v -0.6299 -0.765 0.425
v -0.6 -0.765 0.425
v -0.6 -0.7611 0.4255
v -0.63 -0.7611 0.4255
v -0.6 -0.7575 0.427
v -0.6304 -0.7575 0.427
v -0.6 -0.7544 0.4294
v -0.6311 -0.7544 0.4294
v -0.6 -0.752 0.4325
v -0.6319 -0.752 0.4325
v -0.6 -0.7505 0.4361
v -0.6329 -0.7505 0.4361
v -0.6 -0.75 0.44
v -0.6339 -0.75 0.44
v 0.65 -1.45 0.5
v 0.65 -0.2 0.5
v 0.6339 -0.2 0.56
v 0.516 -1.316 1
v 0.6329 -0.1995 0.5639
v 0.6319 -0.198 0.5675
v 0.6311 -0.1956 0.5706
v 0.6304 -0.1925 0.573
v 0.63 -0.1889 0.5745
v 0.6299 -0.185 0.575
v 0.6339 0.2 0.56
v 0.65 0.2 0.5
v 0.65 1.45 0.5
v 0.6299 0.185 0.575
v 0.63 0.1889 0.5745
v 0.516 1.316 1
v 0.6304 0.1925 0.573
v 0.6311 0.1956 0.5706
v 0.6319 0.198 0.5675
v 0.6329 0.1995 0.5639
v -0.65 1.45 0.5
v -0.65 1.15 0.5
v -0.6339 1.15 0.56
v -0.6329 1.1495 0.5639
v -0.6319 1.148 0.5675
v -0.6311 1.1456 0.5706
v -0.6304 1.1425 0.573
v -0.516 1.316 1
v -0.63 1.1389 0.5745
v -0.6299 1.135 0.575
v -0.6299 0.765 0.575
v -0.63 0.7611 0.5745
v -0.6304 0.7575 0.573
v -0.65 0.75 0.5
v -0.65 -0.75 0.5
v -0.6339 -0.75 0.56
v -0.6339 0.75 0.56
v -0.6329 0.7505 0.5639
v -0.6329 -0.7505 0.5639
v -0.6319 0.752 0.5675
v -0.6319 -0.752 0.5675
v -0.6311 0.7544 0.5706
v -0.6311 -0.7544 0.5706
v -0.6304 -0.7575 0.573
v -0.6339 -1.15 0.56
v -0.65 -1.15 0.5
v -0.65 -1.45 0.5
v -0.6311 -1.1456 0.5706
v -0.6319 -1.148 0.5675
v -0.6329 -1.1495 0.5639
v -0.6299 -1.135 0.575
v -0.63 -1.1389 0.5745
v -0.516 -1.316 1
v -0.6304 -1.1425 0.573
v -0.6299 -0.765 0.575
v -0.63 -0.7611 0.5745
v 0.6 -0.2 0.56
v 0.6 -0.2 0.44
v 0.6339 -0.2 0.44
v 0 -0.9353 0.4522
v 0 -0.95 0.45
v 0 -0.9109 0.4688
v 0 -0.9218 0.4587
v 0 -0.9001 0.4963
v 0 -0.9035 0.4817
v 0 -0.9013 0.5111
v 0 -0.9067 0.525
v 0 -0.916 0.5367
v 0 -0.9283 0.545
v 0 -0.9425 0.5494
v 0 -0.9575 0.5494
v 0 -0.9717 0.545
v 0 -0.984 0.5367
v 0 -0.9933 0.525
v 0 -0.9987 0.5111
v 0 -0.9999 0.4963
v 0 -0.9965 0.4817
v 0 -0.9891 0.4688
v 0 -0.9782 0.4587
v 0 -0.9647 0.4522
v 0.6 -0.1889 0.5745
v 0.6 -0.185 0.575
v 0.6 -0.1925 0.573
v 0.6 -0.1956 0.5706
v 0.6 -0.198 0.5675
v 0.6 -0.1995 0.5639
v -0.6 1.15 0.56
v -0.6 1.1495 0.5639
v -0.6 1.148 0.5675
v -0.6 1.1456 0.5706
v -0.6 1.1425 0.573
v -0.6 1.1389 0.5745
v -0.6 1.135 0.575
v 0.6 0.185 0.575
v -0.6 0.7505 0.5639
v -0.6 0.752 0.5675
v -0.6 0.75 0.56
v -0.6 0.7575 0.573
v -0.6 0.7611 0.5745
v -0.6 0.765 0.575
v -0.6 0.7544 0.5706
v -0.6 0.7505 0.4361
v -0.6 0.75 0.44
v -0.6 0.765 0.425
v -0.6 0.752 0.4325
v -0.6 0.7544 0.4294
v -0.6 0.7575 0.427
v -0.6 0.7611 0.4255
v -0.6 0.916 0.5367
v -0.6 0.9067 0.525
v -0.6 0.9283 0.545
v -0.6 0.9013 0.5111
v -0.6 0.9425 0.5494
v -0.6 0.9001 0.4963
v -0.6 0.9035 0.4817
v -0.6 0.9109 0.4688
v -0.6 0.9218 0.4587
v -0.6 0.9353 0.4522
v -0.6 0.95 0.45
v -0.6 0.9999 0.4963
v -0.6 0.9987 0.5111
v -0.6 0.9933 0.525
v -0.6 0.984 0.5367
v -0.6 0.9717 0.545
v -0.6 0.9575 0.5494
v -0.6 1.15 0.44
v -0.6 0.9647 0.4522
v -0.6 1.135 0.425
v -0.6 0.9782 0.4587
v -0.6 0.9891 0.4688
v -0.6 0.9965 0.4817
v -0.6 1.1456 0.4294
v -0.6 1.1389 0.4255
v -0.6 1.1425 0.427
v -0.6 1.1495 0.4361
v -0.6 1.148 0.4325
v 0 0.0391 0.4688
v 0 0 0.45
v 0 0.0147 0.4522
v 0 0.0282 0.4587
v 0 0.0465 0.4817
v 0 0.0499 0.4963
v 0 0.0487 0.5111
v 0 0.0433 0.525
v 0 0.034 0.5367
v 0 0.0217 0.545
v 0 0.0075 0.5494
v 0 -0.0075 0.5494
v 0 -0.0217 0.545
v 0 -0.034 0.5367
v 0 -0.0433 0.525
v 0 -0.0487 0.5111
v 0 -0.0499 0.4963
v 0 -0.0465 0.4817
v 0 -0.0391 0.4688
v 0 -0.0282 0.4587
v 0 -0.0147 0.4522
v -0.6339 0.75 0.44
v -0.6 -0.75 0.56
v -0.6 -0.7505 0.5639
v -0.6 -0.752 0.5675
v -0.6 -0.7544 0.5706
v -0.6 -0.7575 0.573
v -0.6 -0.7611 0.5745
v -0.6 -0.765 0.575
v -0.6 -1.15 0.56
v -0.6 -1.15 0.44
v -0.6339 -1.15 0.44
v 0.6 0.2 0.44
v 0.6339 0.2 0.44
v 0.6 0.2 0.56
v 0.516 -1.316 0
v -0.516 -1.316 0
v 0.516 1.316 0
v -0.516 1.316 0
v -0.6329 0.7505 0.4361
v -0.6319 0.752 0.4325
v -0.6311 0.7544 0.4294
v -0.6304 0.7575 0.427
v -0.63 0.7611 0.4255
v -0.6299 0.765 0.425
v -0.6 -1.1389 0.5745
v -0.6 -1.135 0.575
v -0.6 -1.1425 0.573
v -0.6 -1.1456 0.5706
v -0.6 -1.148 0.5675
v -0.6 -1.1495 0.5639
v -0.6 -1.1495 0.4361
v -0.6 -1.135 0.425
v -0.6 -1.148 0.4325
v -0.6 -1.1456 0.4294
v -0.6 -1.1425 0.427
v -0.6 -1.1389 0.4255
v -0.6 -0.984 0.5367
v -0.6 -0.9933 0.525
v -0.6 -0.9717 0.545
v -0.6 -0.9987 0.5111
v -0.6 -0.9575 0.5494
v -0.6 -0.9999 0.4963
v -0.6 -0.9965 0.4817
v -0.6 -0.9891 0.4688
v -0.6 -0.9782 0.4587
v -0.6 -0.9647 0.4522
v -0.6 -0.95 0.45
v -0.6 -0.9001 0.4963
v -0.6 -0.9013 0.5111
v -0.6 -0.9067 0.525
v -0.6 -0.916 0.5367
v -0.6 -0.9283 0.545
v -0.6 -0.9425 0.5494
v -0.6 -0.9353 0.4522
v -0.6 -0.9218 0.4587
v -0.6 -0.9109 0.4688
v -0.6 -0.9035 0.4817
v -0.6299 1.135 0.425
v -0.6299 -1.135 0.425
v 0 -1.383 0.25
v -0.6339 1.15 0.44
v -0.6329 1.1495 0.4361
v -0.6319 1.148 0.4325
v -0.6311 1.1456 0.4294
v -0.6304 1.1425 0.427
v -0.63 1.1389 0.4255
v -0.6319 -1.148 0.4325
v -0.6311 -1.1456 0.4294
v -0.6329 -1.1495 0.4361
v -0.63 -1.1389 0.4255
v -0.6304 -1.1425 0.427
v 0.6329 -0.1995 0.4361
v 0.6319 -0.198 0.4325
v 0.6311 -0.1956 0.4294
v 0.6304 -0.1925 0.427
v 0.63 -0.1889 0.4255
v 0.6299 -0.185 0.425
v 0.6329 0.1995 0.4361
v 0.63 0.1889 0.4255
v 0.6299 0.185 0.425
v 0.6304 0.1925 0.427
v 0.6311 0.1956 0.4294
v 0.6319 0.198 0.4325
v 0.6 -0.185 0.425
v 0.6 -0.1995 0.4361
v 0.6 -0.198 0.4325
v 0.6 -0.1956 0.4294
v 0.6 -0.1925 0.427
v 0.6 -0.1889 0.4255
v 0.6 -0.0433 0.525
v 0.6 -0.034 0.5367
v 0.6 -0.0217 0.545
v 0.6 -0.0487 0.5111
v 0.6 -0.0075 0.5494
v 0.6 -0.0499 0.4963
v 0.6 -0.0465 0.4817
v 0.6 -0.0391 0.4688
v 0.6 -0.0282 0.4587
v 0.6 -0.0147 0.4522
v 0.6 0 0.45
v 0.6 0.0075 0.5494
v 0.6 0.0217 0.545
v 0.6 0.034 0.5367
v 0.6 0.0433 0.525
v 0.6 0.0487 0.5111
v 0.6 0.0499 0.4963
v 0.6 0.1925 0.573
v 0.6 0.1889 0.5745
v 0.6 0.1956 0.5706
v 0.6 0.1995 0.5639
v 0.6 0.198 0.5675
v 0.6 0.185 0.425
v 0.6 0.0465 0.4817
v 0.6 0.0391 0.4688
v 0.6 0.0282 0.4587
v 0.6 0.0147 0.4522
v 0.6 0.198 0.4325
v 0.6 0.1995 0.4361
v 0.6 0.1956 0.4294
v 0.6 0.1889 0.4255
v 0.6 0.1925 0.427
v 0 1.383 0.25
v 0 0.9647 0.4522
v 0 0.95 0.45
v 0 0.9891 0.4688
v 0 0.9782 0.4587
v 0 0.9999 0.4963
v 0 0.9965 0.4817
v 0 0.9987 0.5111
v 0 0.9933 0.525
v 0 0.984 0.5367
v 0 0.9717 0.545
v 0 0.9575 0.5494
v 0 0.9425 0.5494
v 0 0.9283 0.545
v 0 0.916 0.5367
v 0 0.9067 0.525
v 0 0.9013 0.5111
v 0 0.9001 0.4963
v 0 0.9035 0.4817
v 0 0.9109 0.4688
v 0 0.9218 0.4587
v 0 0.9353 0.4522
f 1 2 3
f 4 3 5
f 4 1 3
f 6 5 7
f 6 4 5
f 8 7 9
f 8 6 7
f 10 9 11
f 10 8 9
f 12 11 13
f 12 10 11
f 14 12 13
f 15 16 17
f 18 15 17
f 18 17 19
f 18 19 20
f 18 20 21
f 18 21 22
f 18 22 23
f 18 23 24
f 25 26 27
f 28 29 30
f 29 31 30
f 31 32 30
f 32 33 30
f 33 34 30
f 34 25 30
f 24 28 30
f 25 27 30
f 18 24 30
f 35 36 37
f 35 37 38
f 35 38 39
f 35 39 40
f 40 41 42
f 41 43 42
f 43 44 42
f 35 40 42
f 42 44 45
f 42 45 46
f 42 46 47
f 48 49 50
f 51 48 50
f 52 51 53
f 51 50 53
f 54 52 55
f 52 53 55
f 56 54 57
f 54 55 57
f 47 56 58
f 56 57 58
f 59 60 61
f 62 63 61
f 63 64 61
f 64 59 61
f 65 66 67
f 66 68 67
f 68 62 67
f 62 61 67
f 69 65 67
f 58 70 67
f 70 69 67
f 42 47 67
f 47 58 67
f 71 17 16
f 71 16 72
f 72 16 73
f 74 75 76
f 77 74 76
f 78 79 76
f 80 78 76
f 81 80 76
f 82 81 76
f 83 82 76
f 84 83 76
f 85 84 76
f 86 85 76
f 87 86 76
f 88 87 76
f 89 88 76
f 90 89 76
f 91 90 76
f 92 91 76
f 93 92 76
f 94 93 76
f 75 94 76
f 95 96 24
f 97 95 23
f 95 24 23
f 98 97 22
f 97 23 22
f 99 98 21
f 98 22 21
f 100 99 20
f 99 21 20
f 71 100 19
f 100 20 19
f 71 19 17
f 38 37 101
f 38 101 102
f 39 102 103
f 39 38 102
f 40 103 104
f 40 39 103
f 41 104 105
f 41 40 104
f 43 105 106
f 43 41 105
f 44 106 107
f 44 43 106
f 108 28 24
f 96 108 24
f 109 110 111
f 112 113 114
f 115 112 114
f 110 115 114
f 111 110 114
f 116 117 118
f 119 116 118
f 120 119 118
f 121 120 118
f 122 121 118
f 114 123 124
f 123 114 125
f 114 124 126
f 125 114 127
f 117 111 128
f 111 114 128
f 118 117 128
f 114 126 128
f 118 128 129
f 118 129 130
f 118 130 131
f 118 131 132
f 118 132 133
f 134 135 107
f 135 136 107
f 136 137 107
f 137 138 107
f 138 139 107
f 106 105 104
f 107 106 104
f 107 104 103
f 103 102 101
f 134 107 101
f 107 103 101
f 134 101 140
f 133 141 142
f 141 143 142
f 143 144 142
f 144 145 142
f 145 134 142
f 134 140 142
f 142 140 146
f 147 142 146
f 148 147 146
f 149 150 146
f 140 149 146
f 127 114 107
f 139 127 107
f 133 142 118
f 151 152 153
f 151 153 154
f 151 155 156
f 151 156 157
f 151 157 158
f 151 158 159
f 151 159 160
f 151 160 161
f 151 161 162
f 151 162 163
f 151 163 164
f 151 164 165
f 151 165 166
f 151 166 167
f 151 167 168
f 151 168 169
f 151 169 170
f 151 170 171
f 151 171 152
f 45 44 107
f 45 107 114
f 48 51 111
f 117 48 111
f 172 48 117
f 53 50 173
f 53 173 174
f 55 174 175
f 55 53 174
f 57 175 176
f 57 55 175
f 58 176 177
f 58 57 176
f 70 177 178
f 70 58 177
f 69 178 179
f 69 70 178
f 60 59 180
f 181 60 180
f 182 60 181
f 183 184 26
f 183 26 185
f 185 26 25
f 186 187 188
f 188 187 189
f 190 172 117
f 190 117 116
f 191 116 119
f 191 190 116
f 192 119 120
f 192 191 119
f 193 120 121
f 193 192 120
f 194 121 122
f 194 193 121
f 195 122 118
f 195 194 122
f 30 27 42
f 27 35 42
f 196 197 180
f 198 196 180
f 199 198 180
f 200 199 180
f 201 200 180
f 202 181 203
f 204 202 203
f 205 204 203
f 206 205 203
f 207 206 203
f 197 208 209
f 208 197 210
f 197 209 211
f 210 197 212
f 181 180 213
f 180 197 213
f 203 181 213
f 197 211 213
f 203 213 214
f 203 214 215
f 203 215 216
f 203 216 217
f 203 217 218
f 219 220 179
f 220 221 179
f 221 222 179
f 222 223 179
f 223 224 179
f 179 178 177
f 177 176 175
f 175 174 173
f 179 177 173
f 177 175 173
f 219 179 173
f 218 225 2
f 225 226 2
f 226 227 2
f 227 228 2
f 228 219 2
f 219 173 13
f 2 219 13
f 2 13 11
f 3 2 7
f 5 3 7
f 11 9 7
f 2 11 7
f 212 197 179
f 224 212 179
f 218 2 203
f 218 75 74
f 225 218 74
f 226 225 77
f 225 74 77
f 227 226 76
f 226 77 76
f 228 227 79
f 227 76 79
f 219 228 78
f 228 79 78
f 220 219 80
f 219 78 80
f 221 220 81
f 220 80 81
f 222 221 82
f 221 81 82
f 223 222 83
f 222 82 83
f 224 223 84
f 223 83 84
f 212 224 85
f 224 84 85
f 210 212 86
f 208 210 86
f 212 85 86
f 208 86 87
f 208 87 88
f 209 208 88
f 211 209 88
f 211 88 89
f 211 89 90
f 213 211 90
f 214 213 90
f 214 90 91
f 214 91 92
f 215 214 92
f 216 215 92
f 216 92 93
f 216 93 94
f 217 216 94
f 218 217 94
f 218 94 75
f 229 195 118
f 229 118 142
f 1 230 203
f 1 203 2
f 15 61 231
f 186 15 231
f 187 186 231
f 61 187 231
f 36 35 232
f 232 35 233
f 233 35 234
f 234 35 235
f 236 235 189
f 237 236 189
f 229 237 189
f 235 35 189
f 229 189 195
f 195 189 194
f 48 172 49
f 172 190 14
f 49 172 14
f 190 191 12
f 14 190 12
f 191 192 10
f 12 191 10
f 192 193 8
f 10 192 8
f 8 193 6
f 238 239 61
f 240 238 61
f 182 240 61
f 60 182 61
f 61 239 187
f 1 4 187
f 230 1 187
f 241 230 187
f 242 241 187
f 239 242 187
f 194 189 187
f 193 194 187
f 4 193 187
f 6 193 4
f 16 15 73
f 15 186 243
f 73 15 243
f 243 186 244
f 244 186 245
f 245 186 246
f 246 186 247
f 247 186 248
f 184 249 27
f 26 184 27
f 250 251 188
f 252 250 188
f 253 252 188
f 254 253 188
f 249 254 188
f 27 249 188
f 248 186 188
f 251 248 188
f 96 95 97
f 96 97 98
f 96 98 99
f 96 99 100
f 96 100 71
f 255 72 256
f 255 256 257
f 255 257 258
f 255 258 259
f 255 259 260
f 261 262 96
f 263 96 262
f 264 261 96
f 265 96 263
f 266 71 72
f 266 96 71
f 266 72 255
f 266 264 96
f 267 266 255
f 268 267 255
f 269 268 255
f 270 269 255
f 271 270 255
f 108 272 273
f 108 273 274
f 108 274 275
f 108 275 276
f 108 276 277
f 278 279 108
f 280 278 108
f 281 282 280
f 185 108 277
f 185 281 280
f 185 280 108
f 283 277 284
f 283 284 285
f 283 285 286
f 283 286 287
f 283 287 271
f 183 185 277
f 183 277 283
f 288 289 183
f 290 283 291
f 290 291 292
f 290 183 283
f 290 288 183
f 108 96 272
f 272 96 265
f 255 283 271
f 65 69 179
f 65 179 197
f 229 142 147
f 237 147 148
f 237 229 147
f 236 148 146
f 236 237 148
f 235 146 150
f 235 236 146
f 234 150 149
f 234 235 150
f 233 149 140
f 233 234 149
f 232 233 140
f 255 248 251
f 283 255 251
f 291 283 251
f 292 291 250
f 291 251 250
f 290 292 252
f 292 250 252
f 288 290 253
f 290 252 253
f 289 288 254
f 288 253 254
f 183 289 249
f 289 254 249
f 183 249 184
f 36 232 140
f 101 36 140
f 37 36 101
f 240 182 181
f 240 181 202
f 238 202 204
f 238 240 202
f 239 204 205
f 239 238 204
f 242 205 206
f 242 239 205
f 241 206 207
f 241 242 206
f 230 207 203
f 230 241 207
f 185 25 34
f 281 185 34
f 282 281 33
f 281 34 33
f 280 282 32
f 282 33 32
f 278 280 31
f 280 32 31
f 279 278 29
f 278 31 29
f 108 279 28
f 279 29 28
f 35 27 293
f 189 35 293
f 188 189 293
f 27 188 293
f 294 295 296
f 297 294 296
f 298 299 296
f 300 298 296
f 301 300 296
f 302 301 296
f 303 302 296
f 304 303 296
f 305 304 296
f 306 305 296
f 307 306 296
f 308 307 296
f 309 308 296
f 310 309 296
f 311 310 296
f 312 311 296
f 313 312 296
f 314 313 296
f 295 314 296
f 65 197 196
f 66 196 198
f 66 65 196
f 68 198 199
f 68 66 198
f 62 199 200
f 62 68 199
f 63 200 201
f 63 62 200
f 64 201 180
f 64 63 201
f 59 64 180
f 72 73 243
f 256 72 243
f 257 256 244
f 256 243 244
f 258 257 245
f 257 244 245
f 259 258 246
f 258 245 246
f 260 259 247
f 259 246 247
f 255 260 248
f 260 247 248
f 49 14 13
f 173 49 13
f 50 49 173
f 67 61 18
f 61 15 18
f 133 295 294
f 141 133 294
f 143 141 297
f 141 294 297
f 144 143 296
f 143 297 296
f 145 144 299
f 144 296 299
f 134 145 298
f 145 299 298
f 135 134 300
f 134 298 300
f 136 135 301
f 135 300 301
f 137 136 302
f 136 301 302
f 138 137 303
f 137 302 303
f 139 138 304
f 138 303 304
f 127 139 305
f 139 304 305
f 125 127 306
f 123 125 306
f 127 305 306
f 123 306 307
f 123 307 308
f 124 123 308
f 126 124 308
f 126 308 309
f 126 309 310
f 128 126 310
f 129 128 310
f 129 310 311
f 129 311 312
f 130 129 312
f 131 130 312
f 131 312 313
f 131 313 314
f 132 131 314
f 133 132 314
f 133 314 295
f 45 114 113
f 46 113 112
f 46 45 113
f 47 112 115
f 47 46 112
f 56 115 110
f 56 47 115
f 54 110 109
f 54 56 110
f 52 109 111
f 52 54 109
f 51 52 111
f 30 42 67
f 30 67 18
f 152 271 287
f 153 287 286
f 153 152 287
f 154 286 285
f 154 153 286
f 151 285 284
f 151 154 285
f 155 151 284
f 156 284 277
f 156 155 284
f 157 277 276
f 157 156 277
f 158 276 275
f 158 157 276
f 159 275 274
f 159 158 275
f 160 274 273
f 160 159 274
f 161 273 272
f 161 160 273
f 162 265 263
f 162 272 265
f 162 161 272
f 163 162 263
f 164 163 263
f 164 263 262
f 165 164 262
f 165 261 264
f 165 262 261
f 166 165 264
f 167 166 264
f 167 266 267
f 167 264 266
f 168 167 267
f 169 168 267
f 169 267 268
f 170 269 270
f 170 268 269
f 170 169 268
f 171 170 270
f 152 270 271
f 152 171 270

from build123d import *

# Parameters (mm, degrees)
ESBO_O15_W                         = 1.3
ESBO_O15_H                         = 2.9
RESSALTO_EXTRUS_O1_DEPTH           = 0.5
RESSALTO_EXTRUS_O1_TAPER           = 15
RESSALTO_EXTRUS_O1_OTHER_WAY_DEPTH = 0.5
RESSALTO_EXTRUS_O1_OTHER_WAY_TAPER = 15
ESBO_O18_R                         = 0.05
CORTE_EXTRUS_O1_DEPTH              = 1
ESBO_O18_3_R                       = 0.05
CORTE_EXTRUS_O2_DEPTH              = 1
CORTE_EXTRUS_O3_DEPTH              = 0.05
CORTE_EXTRUS_O4_START              = 1.3
CORTE_EXTRUS_O4_DEPTH              = 0.05


with BuildPart() as part:
    # Esbo_o15 → Ressalto-extrus_o1 (new body)
    with BuildSketch(Plane.XY.offset(0.5)):
        Rectangle(ESBO_O15_W, ESBO_O15_H)
    extrude(amount=-RESSALTO_EXTRUS_O1_DEPTH, taper=RESSALTO_EXTRUS_O1_TAPER)

    # Esbo_o15 → Ressalto-extrus_o1 other way (add)
    with BuildSketch(Plane.XY.offset(0.5)):
        Rectangle(ESBO_O15_W, ESBO_O15_H)
    extrude(amount=RESSALTO_EXTRUS_O1_OTHER_WAY_DEPTH, taper=RESSALTO_EXTRUS_O1_OTHER_WAY_TAPER)

    # Esbo_o18 → Corte-extrus_o1 (cut)
    with BuildSketch(Plane(origin=(0, 0, 0), x_dir=(0, 0, -1), z_dir=(1, 0, 0))):
        with Locations((-0.5, 0.95)):
            Circle(ESBO_O18_R)
        with Locations((-0.5, -0.95)):
            Circle(ESBO_O18_R)
    extrude(amount=-CORTE_EXTRUS_O1_DEPTH, mode=Mode.SUBTRACT)

    # Esbo_o18_3 → Corte-extrus_o2 (cut)
    with BuildSketch(Plane(origin=(0, 0, 0), x_dir=(0, 0, -1), z_dir=(1, 0, 0))):
        with Locations((-0.5, 0)):
            Circle(ESBO_O18_3_R)
    extrude(amount=CORTE_EXTRUS_O2_DEPTH, mode=Mode.SUBTRACT)

    # Esbo_o19 → Corte-extrus_o3 (cut)
    with BuildSketch(Plane(origin=(-0.65, 0, 0), x_dir=(0, 0, -1), z_dir=(1, 0, 0))):
        with BuildLine():
            Line((-0.44, 1.15), (-0.56, 1.15))
            ThreePointArc((-0.56, 1.15), (-0.570606602, 1.145606602), (-0.575, 1.135))
            Line((-0.575, 1.135), (-0.575, 0.765))
            ThreePointArc((-0.575, 0.765), (-0.570606602, 0.754393398), (-0.56, 0.75))
            Line((-0.56, 0.75), (-0.44, 0.75))
            ThreePointArc((-0.44, 0.75), (-0.429393398, 0.754393398), (-0.425, 0.765))
            Line((-0.425, 0.765), (-0.425, 1.135))
            ThreePointArc((-0.425, 1.135), (-0.429393398, 1.145606602), (-0.44, 1.15))
        make_face()
        with BuildLine():
            Line((-0.44, -0.75), (-0.56, -0.75))
            ThreePointArc((-0.56, -0.75), (-0.570606602, -0.754393398), (-0.575, -0.765))
            Line((-0.575, -0.765), (-0.575, -1.135))
            ThreePointArc((-0.575, -1.135), (-0.570606602, -1.145606602), (-0.56, -1.15))
            Line((-0.56, -1.15), (-0.44, -1.15))
            ThreePointArc((-0.44, -1.15), (-0.429393398, -1.145606602), (-0.425, -1.135))
            Line((-0.425, -1.135), (-0.425, -0.765))
            ThreePointArc((-0.425, -0.765), (-0.429393398, -0.754393398), (-0.44, -0.75))
        make_face()
    extrude(amount=CORTE_EXTRUS_O3_DEPTH, mode=Mode.SUBTRACT)

    # Esbo_o19_3 → Corte-extrus_o4 (cut)
    with BuildSketch(Plane(origin=(-0.65, 0, 0), x_dir=(0, 0, -1), z_dir=(1, 0, 0)).offset(CORTE_EXTRUS_O4_START)):
        with BuildLine():
            Line((-0.44, 0.2), (-0.56, 0.2))
            ThreePointArc((-0.56, 0.2), (-0.570606602, 0.195606602), (-0.575, 0.185))
            Line((-0.575, 0.185), (-0.575, -0.185))
            ThreePointArc((-0.575, -0.185), (-0.570606602, -0.195606602), (-0.56, -0.2))
            Line((-0.56, -0.2), (-0.44, -0.2))
            ThreePointArc((-0.44, -0.2), (-0.429393398, -0.195606602), (-0.425, -0.185))
            Line((-0.425, -0.185), (-0.425, 0.185))
            ThreePointArc((-0.425, 0.185), (-0.429393398, 0.195606602), (-0.44, 0.2))
        make_face()
    extrude(amount=-CORTE_EXTRUS_O4_DEPTH, mode=Mode.SUBTRACT)


solid = part.part
